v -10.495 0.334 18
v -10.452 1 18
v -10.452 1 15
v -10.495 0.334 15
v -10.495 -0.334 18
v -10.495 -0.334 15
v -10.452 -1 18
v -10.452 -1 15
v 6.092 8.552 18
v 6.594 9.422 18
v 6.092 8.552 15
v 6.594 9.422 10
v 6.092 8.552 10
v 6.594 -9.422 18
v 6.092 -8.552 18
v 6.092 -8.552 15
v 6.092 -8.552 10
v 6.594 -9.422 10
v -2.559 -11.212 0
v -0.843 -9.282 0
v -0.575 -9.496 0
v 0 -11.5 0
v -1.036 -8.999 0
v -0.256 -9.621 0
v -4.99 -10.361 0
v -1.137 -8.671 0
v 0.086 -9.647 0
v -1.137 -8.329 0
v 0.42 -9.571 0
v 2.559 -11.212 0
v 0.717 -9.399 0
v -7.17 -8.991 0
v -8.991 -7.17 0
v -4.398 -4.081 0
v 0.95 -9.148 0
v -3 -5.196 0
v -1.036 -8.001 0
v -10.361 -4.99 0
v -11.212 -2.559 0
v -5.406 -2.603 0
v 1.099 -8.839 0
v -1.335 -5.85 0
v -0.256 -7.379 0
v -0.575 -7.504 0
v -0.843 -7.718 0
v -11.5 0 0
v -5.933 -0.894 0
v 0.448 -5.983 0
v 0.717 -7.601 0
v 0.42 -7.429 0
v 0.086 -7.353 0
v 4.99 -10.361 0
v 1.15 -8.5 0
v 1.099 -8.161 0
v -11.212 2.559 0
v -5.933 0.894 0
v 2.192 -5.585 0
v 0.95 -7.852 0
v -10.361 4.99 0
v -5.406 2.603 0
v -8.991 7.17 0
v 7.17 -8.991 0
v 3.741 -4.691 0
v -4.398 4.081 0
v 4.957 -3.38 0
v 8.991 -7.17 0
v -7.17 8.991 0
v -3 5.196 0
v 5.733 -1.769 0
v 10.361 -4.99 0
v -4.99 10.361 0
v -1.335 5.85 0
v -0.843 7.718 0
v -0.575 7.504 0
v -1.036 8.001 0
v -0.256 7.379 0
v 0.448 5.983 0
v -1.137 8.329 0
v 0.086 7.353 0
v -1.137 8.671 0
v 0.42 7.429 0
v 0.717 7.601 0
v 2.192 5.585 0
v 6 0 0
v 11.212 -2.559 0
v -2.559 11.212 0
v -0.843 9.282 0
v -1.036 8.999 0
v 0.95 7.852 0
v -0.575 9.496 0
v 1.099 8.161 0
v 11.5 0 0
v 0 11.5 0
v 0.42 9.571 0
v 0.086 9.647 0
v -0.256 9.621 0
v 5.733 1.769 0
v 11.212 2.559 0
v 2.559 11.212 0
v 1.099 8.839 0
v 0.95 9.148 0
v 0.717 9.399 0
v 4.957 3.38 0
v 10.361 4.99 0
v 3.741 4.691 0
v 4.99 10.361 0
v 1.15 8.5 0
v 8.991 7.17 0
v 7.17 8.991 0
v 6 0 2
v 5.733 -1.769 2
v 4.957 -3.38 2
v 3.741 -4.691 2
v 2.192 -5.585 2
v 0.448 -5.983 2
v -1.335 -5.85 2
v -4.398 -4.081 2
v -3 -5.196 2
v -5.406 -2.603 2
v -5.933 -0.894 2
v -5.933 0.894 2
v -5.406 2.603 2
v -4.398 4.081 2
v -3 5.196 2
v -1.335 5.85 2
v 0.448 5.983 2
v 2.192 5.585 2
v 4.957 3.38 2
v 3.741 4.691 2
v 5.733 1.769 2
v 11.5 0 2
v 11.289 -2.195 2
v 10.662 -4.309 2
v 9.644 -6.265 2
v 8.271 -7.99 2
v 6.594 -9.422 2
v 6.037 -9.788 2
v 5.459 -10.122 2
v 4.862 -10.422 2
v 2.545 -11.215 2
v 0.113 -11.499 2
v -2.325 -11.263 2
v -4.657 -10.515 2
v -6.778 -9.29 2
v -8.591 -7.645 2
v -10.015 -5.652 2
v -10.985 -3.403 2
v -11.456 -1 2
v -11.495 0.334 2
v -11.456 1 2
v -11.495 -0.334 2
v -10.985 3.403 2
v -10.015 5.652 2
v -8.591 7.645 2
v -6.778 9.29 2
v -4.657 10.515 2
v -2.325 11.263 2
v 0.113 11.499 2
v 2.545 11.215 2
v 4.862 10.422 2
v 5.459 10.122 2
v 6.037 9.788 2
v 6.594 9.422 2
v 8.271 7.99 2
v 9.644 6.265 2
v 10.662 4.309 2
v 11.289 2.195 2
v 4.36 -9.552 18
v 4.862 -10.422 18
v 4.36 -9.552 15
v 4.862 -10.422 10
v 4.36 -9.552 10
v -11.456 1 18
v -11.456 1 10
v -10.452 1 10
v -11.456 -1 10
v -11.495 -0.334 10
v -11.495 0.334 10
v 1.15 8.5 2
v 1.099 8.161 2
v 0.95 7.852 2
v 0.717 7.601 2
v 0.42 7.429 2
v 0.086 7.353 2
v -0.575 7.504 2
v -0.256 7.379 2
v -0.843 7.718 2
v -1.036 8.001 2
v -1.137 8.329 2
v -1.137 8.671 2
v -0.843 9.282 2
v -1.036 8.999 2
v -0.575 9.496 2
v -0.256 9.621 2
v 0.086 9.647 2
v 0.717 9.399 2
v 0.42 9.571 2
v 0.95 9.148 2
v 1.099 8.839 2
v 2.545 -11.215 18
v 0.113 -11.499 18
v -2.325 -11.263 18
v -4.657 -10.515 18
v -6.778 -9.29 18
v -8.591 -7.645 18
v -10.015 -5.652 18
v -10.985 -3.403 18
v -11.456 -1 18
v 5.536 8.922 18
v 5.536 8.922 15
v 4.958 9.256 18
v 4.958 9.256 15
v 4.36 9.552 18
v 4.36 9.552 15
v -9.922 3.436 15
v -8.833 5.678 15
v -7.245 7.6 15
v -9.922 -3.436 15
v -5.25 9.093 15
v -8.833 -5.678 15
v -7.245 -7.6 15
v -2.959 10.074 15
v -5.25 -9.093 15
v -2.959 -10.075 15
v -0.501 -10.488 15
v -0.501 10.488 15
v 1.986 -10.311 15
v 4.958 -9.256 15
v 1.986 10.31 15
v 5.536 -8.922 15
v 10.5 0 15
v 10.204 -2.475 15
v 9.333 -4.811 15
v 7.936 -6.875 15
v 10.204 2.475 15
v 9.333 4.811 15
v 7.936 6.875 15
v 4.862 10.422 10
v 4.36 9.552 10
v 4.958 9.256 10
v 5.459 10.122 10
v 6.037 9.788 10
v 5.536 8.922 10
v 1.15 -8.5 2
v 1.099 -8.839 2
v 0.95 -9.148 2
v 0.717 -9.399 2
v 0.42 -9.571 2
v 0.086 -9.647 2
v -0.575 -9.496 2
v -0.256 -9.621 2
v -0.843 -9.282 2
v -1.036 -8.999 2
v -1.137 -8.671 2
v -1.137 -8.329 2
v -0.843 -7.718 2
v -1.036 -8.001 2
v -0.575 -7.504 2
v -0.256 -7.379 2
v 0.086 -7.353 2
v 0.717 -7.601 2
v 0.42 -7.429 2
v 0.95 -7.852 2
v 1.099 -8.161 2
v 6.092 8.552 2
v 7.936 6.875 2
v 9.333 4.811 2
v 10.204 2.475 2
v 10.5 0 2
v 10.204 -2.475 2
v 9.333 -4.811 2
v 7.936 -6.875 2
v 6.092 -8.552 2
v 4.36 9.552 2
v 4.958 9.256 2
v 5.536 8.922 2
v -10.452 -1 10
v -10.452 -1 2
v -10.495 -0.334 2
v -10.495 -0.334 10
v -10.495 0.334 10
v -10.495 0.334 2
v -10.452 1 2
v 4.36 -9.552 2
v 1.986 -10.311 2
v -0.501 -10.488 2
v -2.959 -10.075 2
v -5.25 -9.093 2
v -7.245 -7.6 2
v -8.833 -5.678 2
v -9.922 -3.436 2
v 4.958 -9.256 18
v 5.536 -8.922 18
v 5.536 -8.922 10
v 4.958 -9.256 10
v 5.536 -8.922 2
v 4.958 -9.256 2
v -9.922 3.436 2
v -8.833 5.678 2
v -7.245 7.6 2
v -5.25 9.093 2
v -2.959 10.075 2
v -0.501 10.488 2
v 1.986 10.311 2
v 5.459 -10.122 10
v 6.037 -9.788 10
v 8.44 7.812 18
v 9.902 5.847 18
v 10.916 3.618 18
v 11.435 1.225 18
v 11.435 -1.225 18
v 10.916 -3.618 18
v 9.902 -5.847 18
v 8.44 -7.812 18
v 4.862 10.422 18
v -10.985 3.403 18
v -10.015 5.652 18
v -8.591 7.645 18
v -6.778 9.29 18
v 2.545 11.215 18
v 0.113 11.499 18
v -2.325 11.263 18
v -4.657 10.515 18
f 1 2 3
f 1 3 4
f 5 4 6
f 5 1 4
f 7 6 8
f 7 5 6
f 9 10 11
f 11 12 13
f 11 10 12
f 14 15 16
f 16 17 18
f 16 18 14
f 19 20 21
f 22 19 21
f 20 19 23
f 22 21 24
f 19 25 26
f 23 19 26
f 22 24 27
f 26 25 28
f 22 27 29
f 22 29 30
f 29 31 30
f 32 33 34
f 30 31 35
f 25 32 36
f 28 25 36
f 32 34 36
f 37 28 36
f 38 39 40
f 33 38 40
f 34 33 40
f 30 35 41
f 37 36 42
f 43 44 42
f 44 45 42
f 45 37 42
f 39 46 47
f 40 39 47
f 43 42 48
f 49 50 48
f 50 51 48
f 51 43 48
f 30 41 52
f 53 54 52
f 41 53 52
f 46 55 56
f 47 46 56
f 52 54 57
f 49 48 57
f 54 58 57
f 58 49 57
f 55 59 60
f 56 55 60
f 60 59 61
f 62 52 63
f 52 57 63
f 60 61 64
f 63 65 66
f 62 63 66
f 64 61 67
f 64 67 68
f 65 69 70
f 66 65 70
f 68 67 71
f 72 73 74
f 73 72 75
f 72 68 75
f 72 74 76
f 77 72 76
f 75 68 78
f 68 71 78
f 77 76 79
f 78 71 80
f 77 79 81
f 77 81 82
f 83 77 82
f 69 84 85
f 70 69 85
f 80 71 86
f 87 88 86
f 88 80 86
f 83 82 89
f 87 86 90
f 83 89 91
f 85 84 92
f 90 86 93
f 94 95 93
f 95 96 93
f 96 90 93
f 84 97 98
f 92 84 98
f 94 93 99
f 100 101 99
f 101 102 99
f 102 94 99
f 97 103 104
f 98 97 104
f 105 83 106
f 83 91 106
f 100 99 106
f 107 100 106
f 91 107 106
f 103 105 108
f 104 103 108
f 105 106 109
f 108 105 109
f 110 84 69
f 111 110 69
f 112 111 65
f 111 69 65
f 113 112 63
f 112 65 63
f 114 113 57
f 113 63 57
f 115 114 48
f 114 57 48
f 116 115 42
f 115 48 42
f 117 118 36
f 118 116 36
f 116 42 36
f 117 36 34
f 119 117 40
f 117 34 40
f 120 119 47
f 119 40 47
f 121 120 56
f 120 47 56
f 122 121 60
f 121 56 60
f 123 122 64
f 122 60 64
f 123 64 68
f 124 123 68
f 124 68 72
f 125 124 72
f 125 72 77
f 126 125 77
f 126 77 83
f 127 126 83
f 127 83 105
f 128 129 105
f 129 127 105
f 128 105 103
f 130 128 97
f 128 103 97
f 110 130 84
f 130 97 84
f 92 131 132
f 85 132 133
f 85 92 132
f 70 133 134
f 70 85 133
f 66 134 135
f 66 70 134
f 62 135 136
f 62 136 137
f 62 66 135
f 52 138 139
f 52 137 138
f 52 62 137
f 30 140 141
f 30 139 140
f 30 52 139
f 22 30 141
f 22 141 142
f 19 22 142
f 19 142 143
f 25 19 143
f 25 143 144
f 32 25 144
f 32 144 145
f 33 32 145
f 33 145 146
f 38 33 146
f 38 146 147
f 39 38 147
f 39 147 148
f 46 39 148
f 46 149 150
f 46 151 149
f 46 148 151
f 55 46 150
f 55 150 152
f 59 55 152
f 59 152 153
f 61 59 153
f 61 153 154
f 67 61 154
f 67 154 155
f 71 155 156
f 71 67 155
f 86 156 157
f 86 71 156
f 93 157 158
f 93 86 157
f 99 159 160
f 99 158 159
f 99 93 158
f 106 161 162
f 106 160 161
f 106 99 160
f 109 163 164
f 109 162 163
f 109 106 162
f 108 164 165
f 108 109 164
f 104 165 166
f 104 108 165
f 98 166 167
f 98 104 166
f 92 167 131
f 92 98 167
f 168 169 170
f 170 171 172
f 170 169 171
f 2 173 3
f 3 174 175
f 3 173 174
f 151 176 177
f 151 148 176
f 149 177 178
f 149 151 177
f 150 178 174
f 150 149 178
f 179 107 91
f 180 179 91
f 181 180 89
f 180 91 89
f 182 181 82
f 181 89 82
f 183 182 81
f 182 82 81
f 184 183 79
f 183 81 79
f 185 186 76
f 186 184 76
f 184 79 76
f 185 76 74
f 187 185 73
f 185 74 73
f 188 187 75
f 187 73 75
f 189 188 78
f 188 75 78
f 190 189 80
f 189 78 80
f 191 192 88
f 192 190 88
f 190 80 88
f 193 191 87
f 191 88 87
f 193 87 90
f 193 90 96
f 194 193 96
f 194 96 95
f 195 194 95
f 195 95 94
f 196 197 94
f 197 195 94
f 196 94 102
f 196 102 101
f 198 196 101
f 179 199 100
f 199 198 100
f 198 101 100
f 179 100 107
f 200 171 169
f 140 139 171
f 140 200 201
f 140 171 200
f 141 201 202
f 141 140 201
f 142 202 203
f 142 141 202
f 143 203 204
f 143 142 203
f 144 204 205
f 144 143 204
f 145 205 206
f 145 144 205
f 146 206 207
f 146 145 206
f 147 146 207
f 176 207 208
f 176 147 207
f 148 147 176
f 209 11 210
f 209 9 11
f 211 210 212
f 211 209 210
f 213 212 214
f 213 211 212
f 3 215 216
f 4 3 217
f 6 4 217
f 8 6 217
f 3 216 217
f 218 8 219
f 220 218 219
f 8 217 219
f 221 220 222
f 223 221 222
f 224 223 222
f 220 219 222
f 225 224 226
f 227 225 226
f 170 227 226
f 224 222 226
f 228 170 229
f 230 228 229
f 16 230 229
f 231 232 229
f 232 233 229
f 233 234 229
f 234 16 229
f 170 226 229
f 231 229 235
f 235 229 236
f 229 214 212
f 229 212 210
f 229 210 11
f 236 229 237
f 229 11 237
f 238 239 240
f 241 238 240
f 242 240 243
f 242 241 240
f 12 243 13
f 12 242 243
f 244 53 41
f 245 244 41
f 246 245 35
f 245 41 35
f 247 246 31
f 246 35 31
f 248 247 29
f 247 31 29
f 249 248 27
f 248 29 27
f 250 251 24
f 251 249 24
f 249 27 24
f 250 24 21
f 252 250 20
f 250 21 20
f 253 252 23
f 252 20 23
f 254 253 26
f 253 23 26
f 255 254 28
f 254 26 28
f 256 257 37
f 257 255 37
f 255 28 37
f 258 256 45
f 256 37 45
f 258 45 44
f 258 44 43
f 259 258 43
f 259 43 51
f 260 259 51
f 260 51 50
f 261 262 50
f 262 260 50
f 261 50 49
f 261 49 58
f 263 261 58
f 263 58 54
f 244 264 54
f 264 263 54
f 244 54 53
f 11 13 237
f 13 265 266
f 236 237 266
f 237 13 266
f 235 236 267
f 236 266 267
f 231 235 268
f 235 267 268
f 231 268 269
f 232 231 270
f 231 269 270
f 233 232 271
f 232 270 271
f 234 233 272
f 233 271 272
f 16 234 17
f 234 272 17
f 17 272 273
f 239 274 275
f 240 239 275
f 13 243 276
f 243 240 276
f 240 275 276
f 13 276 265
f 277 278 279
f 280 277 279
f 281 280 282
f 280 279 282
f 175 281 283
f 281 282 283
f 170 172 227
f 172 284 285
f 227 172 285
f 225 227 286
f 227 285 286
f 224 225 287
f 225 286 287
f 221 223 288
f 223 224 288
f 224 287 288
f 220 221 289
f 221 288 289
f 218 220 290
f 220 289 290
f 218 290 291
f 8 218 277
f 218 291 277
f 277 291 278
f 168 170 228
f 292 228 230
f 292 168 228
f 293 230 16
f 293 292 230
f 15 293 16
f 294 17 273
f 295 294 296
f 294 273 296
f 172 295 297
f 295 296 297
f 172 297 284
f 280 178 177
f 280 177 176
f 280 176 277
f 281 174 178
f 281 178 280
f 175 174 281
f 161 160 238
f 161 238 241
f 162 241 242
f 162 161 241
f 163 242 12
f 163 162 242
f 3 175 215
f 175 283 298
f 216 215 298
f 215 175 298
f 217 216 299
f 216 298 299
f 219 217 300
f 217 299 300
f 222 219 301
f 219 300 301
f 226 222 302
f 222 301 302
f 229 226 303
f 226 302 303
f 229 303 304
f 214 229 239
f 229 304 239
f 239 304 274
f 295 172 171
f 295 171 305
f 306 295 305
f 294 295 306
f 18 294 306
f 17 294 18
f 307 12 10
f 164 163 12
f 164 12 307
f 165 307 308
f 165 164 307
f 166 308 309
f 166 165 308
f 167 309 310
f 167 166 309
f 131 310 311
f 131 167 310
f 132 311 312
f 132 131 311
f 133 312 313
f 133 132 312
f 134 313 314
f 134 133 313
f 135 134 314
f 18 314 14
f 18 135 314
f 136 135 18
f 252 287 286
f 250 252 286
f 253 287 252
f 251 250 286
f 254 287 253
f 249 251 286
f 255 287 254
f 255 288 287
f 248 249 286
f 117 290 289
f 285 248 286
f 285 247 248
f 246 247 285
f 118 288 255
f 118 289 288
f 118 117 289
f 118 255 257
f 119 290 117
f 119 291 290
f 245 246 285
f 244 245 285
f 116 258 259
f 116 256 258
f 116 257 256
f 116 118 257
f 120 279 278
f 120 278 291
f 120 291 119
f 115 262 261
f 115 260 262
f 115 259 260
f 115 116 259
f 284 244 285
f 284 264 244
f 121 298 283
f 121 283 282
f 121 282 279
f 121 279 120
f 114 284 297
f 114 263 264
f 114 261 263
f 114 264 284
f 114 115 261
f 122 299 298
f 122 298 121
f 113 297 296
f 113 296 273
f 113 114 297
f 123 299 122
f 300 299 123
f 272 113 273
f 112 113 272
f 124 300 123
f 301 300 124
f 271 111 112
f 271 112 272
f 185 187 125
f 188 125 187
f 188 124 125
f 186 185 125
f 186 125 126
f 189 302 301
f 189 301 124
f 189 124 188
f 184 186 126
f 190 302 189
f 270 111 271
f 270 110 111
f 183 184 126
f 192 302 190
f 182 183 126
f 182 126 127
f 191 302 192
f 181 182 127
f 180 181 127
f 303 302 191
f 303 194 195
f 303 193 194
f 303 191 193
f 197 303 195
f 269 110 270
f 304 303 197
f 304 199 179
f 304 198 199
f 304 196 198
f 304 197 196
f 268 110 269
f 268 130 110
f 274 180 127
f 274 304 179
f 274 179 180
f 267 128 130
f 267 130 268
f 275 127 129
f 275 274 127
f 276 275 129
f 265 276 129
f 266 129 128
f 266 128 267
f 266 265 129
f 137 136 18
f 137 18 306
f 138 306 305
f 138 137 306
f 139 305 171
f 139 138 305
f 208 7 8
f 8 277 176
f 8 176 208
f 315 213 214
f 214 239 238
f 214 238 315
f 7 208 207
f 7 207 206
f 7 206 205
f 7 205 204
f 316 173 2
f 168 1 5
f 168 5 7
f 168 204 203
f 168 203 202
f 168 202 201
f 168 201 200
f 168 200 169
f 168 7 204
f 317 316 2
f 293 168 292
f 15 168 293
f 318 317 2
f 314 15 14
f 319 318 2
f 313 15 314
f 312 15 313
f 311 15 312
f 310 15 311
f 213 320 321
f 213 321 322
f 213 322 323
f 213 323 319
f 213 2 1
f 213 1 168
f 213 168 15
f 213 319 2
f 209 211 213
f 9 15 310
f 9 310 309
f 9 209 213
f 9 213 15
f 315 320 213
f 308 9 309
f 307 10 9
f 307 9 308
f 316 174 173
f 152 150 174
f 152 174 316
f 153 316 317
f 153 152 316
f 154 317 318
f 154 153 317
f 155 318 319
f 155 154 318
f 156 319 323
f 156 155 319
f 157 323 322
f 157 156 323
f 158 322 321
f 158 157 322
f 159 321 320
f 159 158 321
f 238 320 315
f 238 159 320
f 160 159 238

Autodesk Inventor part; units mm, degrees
ref_plane "YZ Plane" through (0, 0, 0) normal (1, 0, 0) x (0, 1, 0)
ref_plane "XZ Plane" through (0, 0, 0) normal (0, 1, 0) x (-1, 0, 0)
ref_plane "XY Plane" through (0, 0, 0) normal (0, 0, 1) x (1, 0, 0)
sketch "Skizze1" plane through (0, 0, 0) normal (0, 0, 1) x (1, 0, 0)
  circle A0 centre (0, 0) radius 11.5
  circle A1 centre (0, 0) radius 8.5 construction
  circle A2 centre (0, 8.5) radius 1.15
  circle A3 centre (0, -8.5) radius 1.15
  line L0 (0, 16.1) -> (0, -16.1) construction
  circle A4 centre (0, 0) radius 6
  dimension "MEncoder_OuterDia" = 23
  dimension "MEncoder_FixationHole_Dia" = 17
  dimension "d2" = 2.3
  dimension "d3" = 2.3
  dimension "MagneticEnc_Magnet_PassHole" = 12
extrude "Montageplatte" add sketch "Skizze1" along normal blind 2
sketch "Skizze2" plane through (0, 0, 2) normal (0, 0, 1) x (1, 0, 0)
  line L0 (-10.4523, 1) -> (-11.4564, 1)
  line L1 (-11.4564, -1) -> (-10.4523, -1)
  line L2 (-10.4523, 1) -> (-11.5781, -1) construction
  line L3 (-11.5781, 1) -> (-10.4523, -1) construction
  line L4 (-16.1937, 0) -> (16.1156, 0) construction
  circle A0 centre (0, 0) radius 11.5 construction
  circle A1 centre (0, 0) radius 11.5 construction
  arc A2 (-11.4564, 1) -> (-11.4564, -1) centre (0, 0) ccw
  circle A3 centre (0, 0) radius 10.5 construction
  arc A4 (-10.4523, 1) -> (-10.4523, -1) centre (0, 0) ccw
  line L5 (4.3601, -9.5519) -> (4.8622, -10.4216)
  line L6 (6.5942, -9.4216) -> (6.0922, -8.5519)
  line L7 (4.3601, -9.5519) -> (6.6551, -9.5269) construction
  line L8 (4.923, -10.5269) -> (6.0922, -8.5519) construction
  arc A5 (4.8622, -10.4216) -> (6.5942, -9.4216) centre (0, 0) ccw
  arc A6 (4.3601, -9.5519) -> (6.0922, -8.5519) centre (0, 0) ccw
  line L9 (6.0922, 8.5519) -> (6.5942, 9.4216)
  line L10 (4.8622, 10.4216) -> (4.3601, 9.5519)
  line L11 (6.0922, 8.5519) -> (4.923, 10.5269) construction
  line L12 (6.6551, 9.5269) -> (4.3601, 9.5519) construction
  arc A7 (6.5942, 9.4216) -> (4.8622, 10.4216) centre (0, 0) ccw
  arc A8 (6.0922, 8.5519) -> (4.3601, 9.5519) centre (0, 0) ccw
  point P0 (-11.0152, 0)
  point P1 (-11.0152, 0)
  point P2 (-11.0152, 0)
  point P3 (-11.5, 0)
  point P4 (5.5076, -9.5394)
  point P5 (5.5076, -9.5394)
  point P6 (5.5076, -9.5394)
  point P7 (5.75, -9.9593)
  point P8 (5.5076, 9.5394)
  point P9 (5.5076, 9.5394)
  point P10 (5.5076, 9.5394)
  point P11 (5.75, 9.9593)
  dimension "d10" = 2
  dimension "d17" = 2
  dimension "d24" = 1
  dimension "d25" = 1
  dimension "d36" = 21
  dimension "d39" = 360
extrude "Schnaphebel" add sketch "Skizze2" along normal blind 8
sketch "Skizze3" plane through (0, 0, 2) normal (0, 0, 1) x (1, 0, 0)
  circle A0 centre (0, 0) radius 10.5
  line L0 (4.8622, -10.4216) -> (4.3601, -9.5519) projected
  arc A1 (4.3601, -9.5519) -> (6.0922, -8.5519) centre (0, 0) ccw projected
  line L1 (6.0922, -8.5519) -> (6.5942, -9.4216) projected
  arc A2 (6.5942, -9.4216) -> (6.5942, 9.4216) centre (0, 0) ccw projected
  line L2 (6.5942, 9.4216) -> (6.0922, 8.5519) projected
  arc A3 (6.0922, 8.5519) -> (4.3601, 9.5519) centre (0, 0) ccw projected
  line L3 (4.3601, 9.5519) -> (4.8622, 10.4216) projected
  arc A4 (4.8622, 10.4216) -> (-11.4564, 1) centre (0, 0) ccw projected
  line L4 (-11.4564, 1) -> (-10.4523, 1) projected
  arc A5 (-10.4523, 1) -> (-10.4523, -1) centre (0, 0) ccw projected
  line L5 (-10.4523, -1) -> (-11.4564, -1) projected
  arc A6 (-11.4564, -1) -> (4.8622, -10.4216) centre (0, 0) ccw projected
  circle A7 centre (0, 8.5) radius 1.15 projected
  circle A8 centre (0, -8.5) radius 1.15 projected
  circle A9 centre (0, 0) radius 6 projected
  dimension "d41" = 21
extrude "Sensorabdeckung" add sketch "Skizze3" along normal blind 16 contours A0 L2 A2 L1 | A0 L4 A4 L3 | L0 A6 L5 A0
sketch "Skizze4" plane through (0, 0, 18) normal (0, 0, 1) x (1, 0, 0)
  circle A0 centre (0, 0) radius 10.5
  arc A1 (4.3601, 9.5519) -> (-10.4523, 1) centre (0, 0) ccw projected
extrude "Sensorabdeckung Deckel" add sketch "Skizze4" against normal blind 3
properties part number "Magnetic Encoder" material "Polylactid (PLA) black"
